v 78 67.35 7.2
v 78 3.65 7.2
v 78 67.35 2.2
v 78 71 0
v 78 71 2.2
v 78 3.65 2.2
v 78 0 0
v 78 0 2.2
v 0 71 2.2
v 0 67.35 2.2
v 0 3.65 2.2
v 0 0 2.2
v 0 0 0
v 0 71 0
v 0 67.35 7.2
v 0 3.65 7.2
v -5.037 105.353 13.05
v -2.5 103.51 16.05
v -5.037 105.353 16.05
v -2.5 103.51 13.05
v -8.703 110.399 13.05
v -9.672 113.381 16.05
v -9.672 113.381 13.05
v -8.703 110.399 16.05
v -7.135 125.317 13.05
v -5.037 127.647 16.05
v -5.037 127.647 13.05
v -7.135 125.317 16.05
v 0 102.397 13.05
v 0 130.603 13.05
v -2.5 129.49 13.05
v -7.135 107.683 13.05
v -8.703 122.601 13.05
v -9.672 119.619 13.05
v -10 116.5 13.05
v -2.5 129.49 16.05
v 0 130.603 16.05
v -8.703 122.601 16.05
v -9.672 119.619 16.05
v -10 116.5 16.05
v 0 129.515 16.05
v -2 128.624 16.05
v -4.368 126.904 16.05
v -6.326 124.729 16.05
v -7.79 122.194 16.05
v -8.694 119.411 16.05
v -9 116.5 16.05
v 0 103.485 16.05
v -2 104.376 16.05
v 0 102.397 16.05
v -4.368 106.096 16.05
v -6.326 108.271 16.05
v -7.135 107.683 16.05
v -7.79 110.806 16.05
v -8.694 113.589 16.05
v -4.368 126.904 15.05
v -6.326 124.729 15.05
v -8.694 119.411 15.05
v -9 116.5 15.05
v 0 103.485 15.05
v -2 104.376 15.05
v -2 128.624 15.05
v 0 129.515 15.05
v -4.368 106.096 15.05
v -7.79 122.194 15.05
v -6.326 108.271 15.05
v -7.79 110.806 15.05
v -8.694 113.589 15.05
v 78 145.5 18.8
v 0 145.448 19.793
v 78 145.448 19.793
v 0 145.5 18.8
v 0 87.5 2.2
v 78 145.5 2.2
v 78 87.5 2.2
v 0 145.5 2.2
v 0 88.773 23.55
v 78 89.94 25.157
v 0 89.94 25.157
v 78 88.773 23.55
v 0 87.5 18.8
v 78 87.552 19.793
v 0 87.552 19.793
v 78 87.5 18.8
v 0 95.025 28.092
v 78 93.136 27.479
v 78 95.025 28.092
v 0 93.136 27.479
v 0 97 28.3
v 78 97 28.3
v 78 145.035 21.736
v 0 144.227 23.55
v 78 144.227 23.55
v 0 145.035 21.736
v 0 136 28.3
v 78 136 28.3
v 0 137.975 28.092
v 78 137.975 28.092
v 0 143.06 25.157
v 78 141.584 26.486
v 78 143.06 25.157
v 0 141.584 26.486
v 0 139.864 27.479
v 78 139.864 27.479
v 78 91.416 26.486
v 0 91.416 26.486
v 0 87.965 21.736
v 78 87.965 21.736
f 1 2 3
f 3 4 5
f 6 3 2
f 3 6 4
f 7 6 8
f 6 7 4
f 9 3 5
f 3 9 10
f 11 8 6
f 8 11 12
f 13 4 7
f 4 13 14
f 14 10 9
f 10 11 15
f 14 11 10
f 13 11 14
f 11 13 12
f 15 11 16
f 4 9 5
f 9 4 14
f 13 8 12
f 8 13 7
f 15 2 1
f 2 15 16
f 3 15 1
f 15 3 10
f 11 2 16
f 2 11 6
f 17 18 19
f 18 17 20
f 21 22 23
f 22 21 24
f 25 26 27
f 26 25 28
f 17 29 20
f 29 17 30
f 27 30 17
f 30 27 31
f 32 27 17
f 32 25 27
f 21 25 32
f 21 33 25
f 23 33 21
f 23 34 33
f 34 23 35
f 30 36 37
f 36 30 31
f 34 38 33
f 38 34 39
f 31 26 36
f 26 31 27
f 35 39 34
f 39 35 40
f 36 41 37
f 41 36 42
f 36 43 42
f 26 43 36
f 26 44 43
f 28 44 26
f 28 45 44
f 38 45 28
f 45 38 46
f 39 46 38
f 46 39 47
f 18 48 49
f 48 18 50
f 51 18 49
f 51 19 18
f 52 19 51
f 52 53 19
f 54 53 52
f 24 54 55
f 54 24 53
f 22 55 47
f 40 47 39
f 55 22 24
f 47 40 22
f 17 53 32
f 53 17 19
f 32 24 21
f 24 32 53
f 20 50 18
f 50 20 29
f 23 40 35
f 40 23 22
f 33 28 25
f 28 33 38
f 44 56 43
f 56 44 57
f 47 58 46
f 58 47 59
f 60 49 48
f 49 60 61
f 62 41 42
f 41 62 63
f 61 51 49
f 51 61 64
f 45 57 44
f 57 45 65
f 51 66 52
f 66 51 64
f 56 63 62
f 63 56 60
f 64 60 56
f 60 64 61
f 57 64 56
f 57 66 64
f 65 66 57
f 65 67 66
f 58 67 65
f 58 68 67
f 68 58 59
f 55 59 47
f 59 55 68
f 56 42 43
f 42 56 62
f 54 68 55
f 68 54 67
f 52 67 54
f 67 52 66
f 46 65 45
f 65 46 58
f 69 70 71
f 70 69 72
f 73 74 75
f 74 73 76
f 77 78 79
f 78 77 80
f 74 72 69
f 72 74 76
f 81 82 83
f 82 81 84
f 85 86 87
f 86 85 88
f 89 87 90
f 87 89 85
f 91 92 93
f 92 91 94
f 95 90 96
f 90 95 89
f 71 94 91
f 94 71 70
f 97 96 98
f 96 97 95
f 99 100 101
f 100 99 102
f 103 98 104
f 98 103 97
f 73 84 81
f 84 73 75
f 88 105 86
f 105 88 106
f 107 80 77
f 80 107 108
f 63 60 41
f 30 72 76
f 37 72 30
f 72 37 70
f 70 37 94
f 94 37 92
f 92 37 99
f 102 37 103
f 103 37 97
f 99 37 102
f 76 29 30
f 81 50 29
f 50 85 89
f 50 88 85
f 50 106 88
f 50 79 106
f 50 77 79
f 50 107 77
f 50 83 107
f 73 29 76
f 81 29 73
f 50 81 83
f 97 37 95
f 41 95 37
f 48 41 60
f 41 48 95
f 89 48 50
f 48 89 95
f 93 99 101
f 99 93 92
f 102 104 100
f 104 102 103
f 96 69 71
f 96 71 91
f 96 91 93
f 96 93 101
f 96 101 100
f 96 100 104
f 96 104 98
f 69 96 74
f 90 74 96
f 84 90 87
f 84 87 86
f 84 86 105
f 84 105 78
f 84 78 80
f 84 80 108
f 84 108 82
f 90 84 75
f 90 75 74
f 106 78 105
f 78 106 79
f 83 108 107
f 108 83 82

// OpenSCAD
// file: pw_primitives.scad
module hollow_cube(length, width, height, wall_t) {
    difference() {
        two_t = wall_t*2;
        cube([length, width, height]);
        translate([wall_t, wall_t, -0.1]) 
          cube([length-two_t, width-two_t, height+0.2]);
    }
}

module rounded_box(length, width, height, outer_r) {
    // A simple solid box with rounded bottom and side edges.
    // Essentially this is a box with spherical corners and cylindrical
    // edges on the outside.  You can then subtract whatever object you want
    // from it to make it hollow if you like.
    // Parameters are: the external length, width and height,
    // the radius of the corners and edges.
    outer_d = outer_r*2;
    union() translate([outer_r, outer_r, outer_r]) difference() {
        // outer rounded rectangle
        minkowski() {
            cube([length-outer_d, width-outer_d, height-outer_r]);
            sphere(r=outer_r);
        };
        // top face
        translate([-outer_r, -outer_r, height-outer_r]) 
          cube([length+2*outer_r, width+2*outer_r, outer_r]);
    }
}

module ring_rt(height, radius, thickness) { difference() {
    // For when you know the outer radius and the wall thickness.
    cylinder(h=height, r=radius);
    translate([0, 0, -0.05]) 
      cylinder(h=height+0.1, r=max(radius-thickness, 0));
}};
module pipe_rt(height, radius, thickness) ring_rt(height, radius, thickness);
module hollow_cylinder(width, height, wall_t) ring_rt(height, width, wall_t);

module ring_oi(height, o_radius, i_radius) { difference() {
    // For when you know the outer and inner radius but not the wall thickness.
    cylinder(h=height, r=o_radius);
    translate([0, 0, -0.05]) 
      cylinder(h=height+0.1, r=i_radius);   
}};
module pipe_oi(height, o_radius, i_radius) ring_oi(height, o_radius, i_radius);

module hollow_cone_rt(height, bottom_radius, top_radius, thickness) { difference() {
    // For when you know the outer radii and the wall thickness.
    cylinder(h=height, r1=bottom_radius, r2=top_radius);
    translate([0, 0, -0.05]) cylinder(
        h=height+0.1, 
        r1=max(bottom_radius-thickness, 0), r2=max(top_radius-thickness, 0)
    );
}};

module hollow_cone_oi(
    height, o_bot_radius, i_bot_radius, o_top_radius, i_top_radius,
) { difference() {
    // For when you know the outer and inner radii but not the wall thickness.
    cylinder(h=height, r1=o_bot_radius, r2=o_top_radius);
    translate([0, 0, -0.05]) 
      cylinder(h=height+0.1, r1=i_bot_radius, r2=i_top_radius);
}};
module cone_oi(height, bottom_o_radius, top_o_radius, bottom_i_radius, top_i_radius)
  hollow_cone_oi(height, bottom_o_radius, bottom_i_radius, top_o_radius, top_i_radius);

module torus(outer, inner, angle=360)
    rotate_extrude(angle=angle) {
        translate([max(outer-inner, 0), 0, 0]) circle(r=inner);
    };

module conduit_angle_bend(
    bend_radius, pipe_radius, bend_angle, thickness, join_length, overlap_len,
    flange_a=true, flange_b=true
) {
    // A piece of conduit with a pipe outer radius (not diameter) and wall
    // thickness, curving around a bend angle at a bend radius from the centre
    // of the circle.  The two ends can have straight flanges (a flange allows
    // a pipe of pipe radius to fit inside it) with a join length, overlapping
    // into the angle bend for a given length.  The flanges can be disabled, which
    // will result in a smaller piece of straight pipe of the given radius and
    // wall thickness (with no overlap).

    // The actual bend
    difference() {
        torus(bend_radius+thickness, pipe_radius, bend_angle);
        rotate([0, 0, -0.1]) torus(bend_radius, pipe_radius-thickness, bend_angle+0.2);
    };
    // First flange
    translate([bend_radius-pipe_radius+thickness, (flange_a ? overlap_len : 0), 0])
    rotate([90, 0, 0])
    ring_rt(join_length, pipe_radius+(flange_a ? thickness : 0), thickness);
    // Second flange (taken around the angle)
    rotate([0, 0, bend_angle])
    translate([bend_radius-pipe_radius+thickness, join_length-(flange_b ? overlap_len : 0), 0])
    rotate([90, 0, 0])
    ring_rt(join_length, pipe_radius+(flange_b ? thickness : 0), thickness);
}

module spring(spring_r, wire_r, rise_per_rev, turns, step_deg) {
    // A spring of radius spring_r made of wire of radius wire_r, that goes
    // (fractional) turns around, modeled as sphere at each 'node', and a
    // cylinder between each node.  If rise_per_rev is negative, spiral goes
    // 'down' - i.e. is left-handed, rather than right-handed.  If turns is
    // not evenly divisible by step_deg, the final sphere will not be added.
    assert(turns>0, "turns must be positive");
    assert(step_deg>0, "step_deg must be positive");
    // start on X axis at zero.
    x = spring_r; y = 0; z = 0;
    // each complete turn (360deg) goes up one rise_per_rev
    z_factor = rise_per_rev / 360;
    // z angle for each step
    spring_circ = (spring_r*2*PI);
    z_angle = atan(rise_per_rev / spring_circ);
    // step_len is the length of the cylinder joining each node; it's the
    // spiral length of each turn divided by 360/step_deg.
    one_turn_len = sqrt(rise_per_rev*rise_per_rev + spring_circ*spring_circ);
    step_len = one_turn_len / (360/step_deg);
    for(angle = [0 : step_deg : turns*360]) {
        // the 'next' point around the spiral
        xn = spring_r * cos(angle);
        yn = spring_r * sin(angle);
        zn = (angle/360) * rise_per_rev;
        // The sphere node is easy:
        translate([xn, yn, zn]) sphere(r=wire_r);
        // The cylinder joining them is more complicated.  Start with cylinder
        // of step_len, rotate it down to point a step up in Z, then rotate it
        // around Z to point from [x,y,z] to [xn,yn,zn], then move it to [x,y,z]
        if (angle < turns*360) {
            translate([x, y, z]) rotate([0, 0, 90+(angle+step_deg/2)])
                rotate([0, 90-z_angle, 0]) cylinder(h=step_len, r=wire_r);
        }
        x = xn; y = yn; z = zn;
    }
}

module countersunk_bolt_hole(shaft_d, shaft_len, head_d, head_len) {
    // The solid area taken up by a countersunk bolt, to be subtracted
    // from a body to make a screw hole.  The bolt is 'pointing down' and is
    // centred on the Z axis.
    union() {
        cylinder(h=shaft_len, d=shaft_d);
        translate([0, 0, shaft_len-0.01]) cylinder(h=head_len, d1=shaft_d, d2=head_d);
    }
}

module flat_head_bolt_hole(shaft_d, shaft_len, head_d, head_len) {
    // The solid area taken up by a flat-head bolt, to be subtracted
    // from a body to make a screw hole.  The bolt is 'pointing down' and is
    // centred on the Z axis.
    union() {
        cylinder(h=shaft_len, d=shaft_d);
        translate([0, 0, shaft_len-0.01]) cylinder(h=head_len+0.01, d=head_d);
    }
}
// main file
include <pw_primitives.scad>;

body_length=78;
body_width=58;
body_height=26.1;
body_fillet_radius=9.5;
base_width=71;
base_thick=2.2;
step_width=63.7;
step_thick=5;  // from bottom, not from top of base
tab_cyl_height = 3;
tab_cyl_diam = 30;
tab_cyl_length = 10;
tab_cyl_inset_height = 1;

// The actual Trend AirShield battery pack has a solid top box with clips on the
// lower edge, and then the bottom piece has the base and step and holes for the clips.
// For ease of 3D printing and ease of assembly we follow that basic design but
// use bolt / screw holes instead of clips.  The base and step is one part,
// and the top walls, curved top and tab are the other.  Bolts screw in from underneath
// the base to hold the top on.  The top has the cut-outs for the terminals.

union() {
    // base
    cube([body_length, base_width, base_thick]);
    // step
    translate([0, (base_width-step_width)/2, base_thick])
      cube([body_length, step_width, step_thick]);
};

translate([0, base_width+10]) union() {
    // body
    translate([0, (base_width-body_width)/2, base_thick]) hull() {
        cube([body_length, body_width, body_height-body_fillet_radius]);
        // note that if body_fillet_radius*2 > body_height, cylinder will
        // stick out below body and we have no fix for that right now.
        translate([0, body_fillet_radius, body_height-body_fillet_radius])
          rotate([0, 90, 0]) cylinder(h=body_length, r=body_fillet_radius);
        translate([0, body_width-body_fillet_radius, body_height-body_fillet_radius])
          rotate([0, 90, 0]) cylinder(h=body_length, r=body_fillet_radius);
    };
    // tab
    difference() {
        // main tab body
        translate([(tab_cyl_diam/2)-tab_cyl_length, base_width/2, body_height/2])
            cylinder(h=tab_cyl_height, d=tab_cyl_diam);
        // top inset cutout
        translate([
            (tab_cyl_diam/2)-tab_cyl_length, base_width/2,
            body_height/2+(tab_cyl_height-tab_cyl_inset_height)
        ])
            cylinder(h=tab_cyl_inset_height+0.01, d=tab_cyl_diam-tab_cyl_inset_height*2);
    };
}
